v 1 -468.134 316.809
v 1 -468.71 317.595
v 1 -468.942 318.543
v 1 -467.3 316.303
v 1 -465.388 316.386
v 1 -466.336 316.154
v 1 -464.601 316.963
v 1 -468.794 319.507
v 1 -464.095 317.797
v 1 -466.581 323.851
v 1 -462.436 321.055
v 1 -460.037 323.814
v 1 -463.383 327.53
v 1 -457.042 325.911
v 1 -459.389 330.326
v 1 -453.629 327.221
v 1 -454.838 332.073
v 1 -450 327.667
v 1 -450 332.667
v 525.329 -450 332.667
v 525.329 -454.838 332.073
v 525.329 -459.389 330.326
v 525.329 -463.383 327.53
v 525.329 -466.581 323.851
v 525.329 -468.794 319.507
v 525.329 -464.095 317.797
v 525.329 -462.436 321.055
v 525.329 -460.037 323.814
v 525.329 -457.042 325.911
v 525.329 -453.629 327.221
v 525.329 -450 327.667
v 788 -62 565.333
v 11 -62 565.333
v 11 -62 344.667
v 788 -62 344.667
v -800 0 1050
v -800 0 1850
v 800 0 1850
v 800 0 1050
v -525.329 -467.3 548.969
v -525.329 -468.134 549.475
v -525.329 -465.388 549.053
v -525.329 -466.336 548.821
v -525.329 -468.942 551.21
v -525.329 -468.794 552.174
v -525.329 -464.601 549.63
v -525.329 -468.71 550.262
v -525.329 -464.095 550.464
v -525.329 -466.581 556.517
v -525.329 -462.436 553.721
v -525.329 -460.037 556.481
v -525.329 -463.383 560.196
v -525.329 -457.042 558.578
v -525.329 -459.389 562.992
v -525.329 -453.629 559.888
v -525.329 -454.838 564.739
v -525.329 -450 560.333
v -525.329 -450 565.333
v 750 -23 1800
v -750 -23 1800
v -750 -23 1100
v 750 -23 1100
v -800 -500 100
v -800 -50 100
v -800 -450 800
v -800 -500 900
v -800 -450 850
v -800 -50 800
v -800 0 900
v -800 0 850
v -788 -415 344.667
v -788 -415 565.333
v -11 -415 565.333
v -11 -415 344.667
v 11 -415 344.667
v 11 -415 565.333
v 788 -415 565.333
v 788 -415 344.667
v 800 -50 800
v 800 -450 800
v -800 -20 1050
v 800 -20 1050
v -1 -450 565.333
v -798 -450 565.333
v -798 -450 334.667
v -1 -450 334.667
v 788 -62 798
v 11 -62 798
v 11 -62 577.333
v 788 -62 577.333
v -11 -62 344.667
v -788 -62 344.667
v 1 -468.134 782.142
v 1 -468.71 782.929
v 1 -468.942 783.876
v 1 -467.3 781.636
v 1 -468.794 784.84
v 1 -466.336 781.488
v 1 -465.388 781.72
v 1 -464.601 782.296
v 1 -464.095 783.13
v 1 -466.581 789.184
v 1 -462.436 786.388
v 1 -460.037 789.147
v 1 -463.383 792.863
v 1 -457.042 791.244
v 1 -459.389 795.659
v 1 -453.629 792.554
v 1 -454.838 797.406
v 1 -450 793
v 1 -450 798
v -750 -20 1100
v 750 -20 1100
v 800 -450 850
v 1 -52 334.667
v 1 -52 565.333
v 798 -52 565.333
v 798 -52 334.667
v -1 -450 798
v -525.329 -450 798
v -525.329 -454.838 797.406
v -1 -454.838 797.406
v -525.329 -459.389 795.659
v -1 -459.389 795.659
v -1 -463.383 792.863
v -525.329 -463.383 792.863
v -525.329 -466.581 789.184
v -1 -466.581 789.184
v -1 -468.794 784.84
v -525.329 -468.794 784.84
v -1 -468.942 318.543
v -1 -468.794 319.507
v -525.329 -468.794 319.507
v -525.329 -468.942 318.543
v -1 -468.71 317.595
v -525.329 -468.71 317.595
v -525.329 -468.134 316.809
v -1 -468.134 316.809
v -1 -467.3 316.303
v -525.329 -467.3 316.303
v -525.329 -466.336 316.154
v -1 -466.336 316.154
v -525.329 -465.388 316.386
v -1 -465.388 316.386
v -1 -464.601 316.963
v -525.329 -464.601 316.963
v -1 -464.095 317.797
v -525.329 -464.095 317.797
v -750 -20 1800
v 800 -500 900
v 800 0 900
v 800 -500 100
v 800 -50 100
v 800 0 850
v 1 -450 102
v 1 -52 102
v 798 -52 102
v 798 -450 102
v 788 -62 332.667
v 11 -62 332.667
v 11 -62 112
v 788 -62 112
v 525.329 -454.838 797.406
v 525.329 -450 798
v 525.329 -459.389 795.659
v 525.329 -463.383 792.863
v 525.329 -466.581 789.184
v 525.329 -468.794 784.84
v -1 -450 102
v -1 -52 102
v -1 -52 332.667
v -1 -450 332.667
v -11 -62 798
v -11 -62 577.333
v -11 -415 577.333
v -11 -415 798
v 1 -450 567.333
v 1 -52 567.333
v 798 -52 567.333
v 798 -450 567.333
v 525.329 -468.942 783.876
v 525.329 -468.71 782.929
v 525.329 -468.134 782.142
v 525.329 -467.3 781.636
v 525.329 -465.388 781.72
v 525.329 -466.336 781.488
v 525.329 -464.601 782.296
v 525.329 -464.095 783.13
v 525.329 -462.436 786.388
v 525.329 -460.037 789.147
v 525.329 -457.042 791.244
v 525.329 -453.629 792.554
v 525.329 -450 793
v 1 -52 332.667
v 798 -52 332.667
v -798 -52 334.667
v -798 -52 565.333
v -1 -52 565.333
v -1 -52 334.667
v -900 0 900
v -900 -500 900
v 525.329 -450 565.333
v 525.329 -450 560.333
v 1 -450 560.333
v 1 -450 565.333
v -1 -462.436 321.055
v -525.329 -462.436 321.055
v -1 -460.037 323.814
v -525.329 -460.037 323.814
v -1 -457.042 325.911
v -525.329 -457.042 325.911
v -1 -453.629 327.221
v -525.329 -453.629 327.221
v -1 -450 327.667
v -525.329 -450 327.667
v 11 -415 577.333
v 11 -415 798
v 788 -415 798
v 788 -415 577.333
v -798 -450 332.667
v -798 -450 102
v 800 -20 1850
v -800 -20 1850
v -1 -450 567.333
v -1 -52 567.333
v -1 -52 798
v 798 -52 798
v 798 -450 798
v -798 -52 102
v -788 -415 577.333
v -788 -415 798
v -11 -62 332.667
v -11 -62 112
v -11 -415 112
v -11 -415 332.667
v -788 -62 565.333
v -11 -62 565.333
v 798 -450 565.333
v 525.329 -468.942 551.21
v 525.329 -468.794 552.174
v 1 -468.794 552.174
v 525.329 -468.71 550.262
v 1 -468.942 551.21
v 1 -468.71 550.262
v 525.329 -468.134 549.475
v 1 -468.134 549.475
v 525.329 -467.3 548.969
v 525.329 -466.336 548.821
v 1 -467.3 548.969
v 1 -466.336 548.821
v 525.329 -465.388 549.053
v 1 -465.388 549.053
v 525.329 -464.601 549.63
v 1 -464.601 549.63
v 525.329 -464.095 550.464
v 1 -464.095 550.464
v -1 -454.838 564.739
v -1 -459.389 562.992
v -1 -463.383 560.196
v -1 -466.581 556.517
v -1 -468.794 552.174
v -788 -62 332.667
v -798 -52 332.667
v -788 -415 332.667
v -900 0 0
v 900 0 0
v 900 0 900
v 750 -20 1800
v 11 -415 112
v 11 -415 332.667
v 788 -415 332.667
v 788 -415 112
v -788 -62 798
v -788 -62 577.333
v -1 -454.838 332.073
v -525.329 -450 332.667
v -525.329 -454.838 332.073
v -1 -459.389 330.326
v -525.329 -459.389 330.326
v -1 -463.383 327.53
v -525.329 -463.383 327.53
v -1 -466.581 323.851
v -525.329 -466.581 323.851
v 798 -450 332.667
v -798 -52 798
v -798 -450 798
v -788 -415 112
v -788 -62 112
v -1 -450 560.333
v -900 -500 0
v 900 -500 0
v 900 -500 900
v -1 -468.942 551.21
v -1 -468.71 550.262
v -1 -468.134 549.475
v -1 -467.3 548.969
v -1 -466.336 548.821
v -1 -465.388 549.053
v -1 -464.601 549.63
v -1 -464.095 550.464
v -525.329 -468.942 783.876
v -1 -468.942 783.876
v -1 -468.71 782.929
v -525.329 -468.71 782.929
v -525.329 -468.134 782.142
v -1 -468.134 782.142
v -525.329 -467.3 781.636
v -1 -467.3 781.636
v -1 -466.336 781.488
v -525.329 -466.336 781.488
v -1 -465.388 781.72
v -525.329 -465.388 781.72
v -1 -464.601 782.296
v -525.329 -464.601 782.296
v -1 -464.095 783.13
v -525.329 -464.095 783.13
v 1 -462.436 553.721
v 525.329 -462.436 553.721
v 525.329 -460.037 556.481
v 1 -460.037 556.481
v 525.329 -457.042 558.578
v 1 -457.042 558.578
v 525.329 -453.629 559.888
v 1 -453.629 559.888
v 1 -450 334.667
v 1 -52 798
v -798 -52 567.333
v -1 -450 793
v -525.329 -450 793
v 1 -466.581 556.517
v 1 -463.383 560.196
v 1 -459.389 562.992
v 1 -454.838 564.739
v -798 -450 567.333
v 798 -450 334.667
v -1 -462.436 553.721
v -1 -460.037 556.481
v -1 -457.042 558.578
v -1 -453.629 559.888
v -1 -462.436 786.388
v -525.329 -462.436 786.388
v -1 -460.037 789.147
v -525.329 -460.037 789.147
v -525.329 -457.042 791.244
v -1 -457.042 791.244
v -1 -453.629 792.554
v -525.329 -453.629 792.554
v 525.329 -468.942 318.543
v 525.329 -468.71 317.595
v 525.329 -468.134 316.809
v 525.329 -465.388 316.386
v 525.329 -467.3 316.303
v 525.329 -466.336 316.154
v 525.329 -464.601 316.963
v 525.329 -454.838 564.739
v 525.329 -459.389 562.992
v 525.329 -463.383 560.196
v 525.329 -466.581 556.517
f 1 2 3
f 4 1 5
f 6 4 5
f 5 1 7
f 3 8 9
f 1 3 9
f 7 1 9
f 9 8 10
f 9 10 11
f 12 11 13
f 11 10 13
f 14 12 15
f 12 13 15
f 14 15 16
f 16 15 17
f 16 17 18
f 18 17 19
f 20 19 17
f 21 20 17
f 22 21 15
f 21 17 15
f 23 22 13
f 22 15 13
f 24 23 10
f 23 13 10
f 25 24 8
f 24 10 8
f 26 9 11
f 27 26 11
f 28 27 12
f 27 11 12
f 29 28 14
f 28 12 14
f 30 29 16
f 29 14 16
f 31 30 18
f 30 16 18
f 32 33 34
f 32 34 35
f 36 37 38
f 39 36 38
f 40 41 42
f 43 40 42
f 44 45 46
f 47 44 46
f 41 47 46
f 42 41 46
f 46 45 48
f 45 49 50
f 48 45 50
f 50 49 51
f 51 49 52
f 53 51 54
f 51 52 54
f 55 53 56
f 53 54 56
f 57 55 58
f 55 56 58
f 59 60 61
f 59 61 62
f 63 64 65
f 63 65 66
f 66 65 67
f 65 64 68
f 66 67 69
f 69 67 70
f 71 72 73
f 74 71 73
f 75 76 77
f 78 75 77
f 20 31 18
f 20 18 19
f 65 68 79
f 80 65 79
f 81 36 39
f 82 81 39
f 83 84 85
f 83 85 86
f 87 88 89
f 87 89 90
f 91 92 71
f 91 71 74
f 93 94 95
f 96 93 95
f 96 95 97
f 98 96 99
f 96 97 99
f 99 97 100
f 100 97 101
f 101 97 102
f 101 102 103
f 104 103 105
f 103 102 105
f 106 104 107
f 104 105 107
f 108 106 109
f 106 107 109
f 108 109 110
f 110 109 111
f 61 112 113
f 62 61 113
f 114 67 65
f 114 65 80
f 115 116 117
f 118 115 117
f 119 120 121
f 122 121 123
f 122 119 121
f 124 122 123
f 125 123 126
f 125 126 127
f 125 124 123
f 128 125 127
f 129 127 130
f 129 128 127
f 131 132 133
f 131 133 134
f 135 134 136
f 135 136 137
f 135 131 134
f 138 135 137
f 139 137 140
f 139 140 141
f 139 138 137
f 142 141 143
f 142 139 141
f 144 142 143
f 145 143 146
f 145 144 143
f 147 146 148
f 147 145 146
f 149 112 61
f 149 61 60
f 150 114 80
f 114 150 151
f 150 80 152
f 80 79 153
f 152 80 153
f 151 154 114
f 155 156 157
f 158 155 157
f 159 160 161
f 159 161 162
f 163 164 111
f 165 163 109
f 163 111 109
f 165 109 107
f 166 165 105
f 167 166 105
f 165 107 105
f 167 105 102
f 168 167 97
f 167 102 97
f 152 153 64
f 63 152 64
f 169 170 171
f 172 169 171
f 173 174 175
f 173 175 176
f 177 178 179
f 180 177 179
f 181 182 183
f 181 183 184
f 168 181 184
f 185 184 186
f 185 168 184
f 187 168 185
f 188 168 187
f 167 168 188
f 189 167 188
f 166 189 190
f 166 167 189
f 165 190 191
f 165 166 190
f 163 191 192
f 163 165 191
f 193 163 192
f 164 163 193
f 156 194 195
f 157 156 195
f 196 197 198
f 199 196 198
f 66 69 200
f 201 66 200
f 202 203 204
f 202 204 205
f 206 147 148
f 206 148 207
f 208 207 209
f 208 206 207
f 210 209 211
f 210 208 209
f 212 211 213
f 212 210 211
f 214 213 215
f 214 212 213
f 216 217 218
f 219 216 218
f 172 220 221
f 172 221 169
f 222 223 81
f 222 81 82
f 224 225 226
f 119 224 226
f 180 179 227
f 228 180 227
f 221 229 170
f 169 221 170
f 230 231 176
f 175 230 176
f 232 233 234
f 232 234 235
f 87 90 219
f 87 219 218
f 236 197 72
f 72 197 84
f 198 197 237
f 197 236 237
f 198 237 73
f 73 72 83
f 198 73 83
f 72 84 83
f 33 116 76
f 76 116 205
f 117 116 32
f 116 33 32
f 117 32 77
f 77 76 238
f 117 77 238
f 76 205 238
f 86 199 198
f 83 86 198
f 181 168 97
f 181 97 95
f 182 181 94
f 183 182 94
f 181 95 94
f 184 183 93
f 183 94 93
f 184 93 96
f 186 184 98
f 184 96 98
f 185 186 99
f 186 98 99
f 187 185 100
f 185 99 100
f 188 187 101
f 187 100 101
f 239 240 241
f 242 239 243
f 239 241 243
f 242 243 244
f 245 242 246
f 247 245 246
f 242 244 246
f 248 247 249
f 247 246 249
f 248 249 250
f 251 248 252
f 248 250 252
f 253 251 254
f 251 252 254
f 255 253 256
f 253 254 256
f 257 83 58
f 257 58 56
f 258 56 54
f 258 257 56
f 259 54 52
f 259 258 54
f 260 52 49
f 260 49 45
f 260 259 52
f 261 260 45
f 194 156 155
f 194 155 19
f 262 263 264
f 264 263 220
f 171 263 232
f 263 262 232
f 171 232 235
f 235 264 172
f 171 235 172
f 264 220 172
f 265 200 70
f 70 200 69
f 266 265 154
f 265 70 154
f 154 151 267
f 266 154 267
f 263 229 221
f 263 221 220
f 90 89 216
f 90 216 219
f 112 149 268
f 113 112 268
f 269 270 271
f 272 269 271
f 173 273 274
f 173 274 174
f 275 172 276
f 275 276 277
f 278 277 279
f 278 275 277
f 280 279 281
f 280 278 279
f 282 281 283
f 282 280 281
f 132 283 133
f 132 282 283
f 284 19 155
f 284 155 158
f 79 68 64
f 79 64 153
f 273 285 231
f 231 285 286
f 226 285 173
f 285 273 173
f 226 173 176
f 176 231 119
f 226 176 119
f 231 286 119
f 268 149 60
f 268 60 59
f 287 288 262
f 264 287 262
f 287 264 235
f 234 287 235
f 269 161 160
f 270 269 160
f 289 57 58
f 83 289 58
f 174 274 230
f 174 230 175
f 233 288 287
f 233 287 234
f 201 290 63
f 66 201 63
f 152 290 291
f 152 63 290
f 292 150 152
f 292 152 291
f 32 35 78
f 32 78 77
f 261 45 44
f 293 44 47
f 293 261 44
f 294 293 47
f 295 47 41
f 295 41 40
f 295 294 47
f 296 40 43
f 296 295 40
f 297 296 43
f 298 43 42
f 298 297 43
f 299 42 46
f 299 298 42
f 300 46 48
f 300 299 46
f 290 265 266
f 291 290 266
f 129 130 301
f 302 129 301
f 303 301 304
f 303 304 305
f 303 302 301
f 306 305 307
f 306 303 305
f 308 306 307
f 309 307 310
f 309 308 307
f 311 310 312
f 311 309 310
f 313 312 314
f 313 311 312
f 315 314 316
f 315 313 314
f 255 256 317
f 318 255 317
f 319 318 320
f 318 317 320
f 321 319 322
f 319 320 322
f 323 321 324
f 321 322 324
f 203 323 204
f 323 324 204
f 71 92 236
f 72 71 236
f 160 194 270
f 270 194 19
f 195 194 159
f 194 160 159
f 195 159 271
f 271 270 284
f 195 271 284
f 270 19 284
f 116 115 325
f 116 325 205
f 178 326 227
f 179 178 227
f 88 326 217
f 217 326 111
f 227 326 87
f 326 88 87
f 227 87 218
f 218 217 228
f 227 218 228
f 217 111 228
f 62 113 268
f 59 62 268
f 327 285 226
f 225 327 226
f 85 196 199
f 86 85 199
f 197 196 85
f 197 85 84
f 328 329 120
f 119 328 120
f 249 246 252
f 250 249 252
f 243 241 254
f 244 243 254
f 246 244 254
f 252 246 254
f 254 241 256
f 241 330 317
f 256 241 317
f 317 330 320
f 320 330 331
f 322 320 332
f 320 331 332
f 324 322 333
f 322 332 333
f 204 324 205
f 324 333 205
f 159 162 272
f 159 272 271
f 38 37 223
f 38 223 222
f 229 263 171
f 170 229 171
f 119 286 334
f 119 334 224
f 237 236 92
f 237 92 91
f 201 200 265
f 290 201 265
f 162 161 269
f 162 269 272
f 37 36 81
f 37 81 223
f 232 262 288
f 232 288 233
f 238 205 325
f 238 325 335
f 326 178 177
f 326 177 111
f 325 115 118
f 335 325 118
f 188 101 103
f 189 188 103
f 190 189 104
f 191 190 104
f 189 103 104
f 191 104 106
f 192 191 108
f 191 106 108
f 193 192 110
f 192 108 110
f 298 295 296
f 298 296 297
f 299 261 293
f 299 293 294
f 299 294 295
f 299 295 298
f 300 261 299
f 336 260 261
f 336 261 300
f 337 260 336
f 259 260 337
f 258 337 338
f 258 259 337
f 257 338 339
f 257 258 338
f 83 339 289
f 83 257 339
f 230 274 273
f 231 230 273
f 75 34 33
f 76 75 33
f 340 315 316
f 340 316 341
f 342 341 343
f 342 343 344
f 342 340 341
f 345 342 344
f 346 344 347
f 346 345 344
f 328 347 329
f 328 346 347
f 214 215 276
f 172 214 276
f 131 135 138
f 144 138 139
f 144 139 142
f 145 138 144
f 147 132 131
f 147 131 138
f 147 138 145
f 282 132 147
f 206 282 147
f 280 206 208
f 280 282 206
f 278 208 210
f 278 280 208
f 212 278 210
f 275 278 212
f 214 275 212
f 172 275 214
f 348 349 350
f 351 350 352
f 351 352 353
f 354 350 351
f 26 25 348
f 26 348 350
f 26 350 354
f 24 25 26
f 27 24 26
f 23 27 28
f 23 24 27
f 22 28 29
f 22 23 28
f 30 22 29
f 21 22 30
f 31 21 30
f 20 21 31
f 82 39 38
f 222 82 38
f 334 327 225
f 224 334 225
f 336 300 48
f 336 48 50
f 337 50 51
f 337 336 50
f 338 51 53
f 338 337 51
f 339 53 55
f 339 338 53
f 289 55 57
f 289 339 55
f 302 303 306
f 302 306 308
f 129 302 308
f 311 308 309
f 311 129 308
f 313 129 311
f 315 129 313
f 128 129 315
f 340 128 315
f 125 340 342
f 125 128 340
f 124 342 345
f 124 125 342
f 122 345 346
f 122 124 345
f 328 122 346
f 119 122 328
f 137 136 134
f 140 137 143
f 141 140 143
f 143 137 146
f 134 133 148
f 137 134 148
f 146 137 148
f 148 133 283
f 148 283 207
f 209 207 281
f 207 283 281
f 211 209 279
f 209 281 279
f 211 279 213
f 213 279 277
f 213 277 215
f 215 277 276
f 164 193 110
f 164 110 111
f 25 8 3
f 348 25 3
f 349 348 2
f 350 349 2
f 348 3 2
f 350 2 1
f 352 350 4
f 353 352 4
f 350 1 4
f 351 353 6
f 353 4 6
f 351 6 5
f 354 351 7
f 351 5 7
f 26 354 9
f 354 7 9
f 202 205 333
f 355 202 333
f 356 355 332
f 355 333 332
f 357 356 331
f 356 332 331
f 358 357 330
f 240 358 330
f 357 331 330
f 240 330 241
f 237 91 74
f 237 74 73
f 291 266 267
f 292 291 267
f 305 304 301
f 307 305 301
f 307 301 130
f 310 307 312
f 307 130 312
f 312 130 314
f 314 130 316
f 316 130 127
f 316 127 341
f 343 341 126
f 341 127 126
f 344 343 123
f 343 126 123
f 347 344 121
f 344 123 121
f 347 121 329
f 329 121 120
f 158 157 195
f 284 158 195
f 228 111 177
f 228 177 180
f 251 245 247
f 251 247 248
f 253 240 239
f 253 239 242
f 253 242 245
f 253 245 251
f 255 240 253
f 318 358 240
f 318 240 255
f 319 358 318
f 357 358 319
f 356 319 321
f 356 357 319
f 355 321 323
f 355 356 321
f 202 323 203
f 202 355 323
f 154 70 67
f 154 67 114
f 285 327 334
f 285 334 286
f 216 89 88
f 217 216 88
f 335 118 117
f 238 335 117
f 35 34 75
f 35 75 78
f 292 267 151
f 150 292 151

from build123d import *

# Parameters (mm, degrees)
F9_DEPTH  = 500
F8_W      = 1600
F8_H      = 50
F10_DEPTH = 450
F8_H_2    = 700
F8_W_2    = 797
F8_H_3    = 230.6666666667
F11_DEPTH = 50
F12_START = 52
F12_DEPTH = 398
F13_T     = -10
F13_2_T   = -10
F13_3_T   = -10
F13_4_T   = -10
F13_5_T   = -10
F13_6_T   = -10
F14_DEPTH = 25
F16_START = 1
F16_DEPTH = 524.3288918326
F8_H_4    = 800
F8_W_3    = 1500
F18_DEPTH = 20
F19_START = 20
F19_DEPTH = 3


with BuildPart() as f9:
    # F8 (on Front) → F9 (new body)
    with BuildSketch(Plane.XZ):
        Polygon((-900, 900), (-900, 0), (900, 0), (900, 900), (800, 900), (800, 850), (800, 800), (800, 100), (-800, 100), (-800, 800), (-800, 850), (-800, 900), align=None)
    extrude(amount=F9_DEPTH)

    # F8 (on Front) → F10 (join)
    with BuildSketch(Plane.XZ):
        with Locations((0, 825)):
            Rectangle(F8_W, F8_H)
    extrude(amount=F10_DEPTH)

    # F8 (on Front) → F11 (join)
    with BuildSketch(Plane.XZ):
        with Locations((0, 450)):
            Rectangle(F8_W, F8_H_2)
        with Locations((-399.5, 217.3333333333)):
            Rectangle(F8_W_2, F8_H_3, mode=Mode.SUBTRACT)
        with Locations((-399.5, 450)):
            Rectangle(F8_W_2, F8_H_3, mode=Mode.SUBTRACT)
        with Locations((-399.5, 682.6666666667)):
            Rectangle(F8_W_2, F8_H_3, mode=Mode.SUBTRACT)
        with Locations((399.5, 217.3333333333)):
            Rectangle(F8_W_2, F8_H_3, mode=Mode.SUBTRACT)
        with Locations((399.5, 450)):
            Rectangle(F8_W_2, F8_H_3, mode=Mode.SUBTRACT)
        with Locations((399.5, 682.6666666667)):
            Rectangle(F8_W_2, F8_H_3, mode=Mode.SUBTRACT)
        with Locations((-399.5, 682.6666666667)):
            Rectangle(F8_W_2, F8_H_3)
        with Locations((-399.5, 450)):
            Rectangle(F8_W_2, F8_H_3)
        with Locations((-399.5, 217.3333333333)):
            Rectangle(F8_W_2, F8_H_3)
        with Locations((399.5, 682.6666666667)):
            Rectangle(F8_W_2, F8_H_3)
        with Locations((399.5, 450)):
            Rectangle(F8_W_2, F8_H_3)
        with Locations((399.5, 217.3333333333)):
            Rectangle(F8_W_2, F8_H_3)
    extrude(amount=F11_DEPTH)


with BuildPart() as f12:
    # F8 (on Front) → F12 (new body)
    with BuildSketch(Plane.XZ.offset(F12_START)):
        with Locations((-399.5, 682.6666666667)):
            Rectangle(F8_W_2, F8_H_3)
    extrude(amount=F12_DEPTH)

    # F13#2
    f13_2_openings = [f12.faces().sort_by_distance(p)[0] for p in [
        (-399.5, -251, 798),
    ]]
    offset(amount=F13_2_T, openings=f13_2_openings)

    # F14 (add): a face of the model
    f14_faces = [f12.faces().sort_by_distance(p)[0] for p in [
        (-399.5, -440, 687.6666666667),
    ]]
    extrude(f14_faces, amount=F14_DEPTH)


with BuildPart() as f12b:
    # F8 (on Front) → F12, piece 2 (new body)
    with BuildSketch(Plane.XZ.offset(F12_START)):
        with Locations((399.5, 682.6666666667)):
            Rectangle(F8_W_2, F8_H_3)
    extrude(amount=F12_DEPTH)

    # F13
    f13_openings = [f12b.faces().sort_by_distance(p)[0] for p in [
        (399.5, -251, 798),
    ]]
    offset(amount=F13_T, openings=f13_openings)

    # F14#2 (add): a face of the model
    f14_2_faces = [f12b.faces().sort_by_distance(p)[0] for p in [
        (399.5, -440, 687.6666666667),
    ]]
    extrude(f14_2_faces, amount=F14_DEPTH)


with BuildPart() as f12c:
    # F8 (on Front) → F12, piece 3 (new body)
    with BuildSketch(Plane.XZ.offset(F12_START)):
        with Locations((-399.5, 450)):
            Rectangle(F8_W_2, F8_H_3)
    extrude(amount=F12_DEPTH)

    # F13#4
    f13_4_openings = [f12c.faces().sort_by_distance(p)[0] for p in [
        (-399.5, -251, 565.333333),
    ]]
    offset(amount=F13_4_T, openings=f13_4_openings)

    # F14#3 (add): a face of the model
    f14_3_faces = [f12c.faces().sort_by_distance(p)[0] for p in [
        (-399.5, -440, 455),
    ]]
    extrude(f14_3_faces, amount=F14_DEPTH)


with BuildPart() as f12d:
    # F8 (on Front) → F12, piece 4 (new body)
    with BuildSketch(Plane.XZ.offset(F12_START)):
        with Locations((399.5, 450)):
            Rectangle(F8_W_2, F8_H_3)
    extrude(amount=F12_DEPTH)

    # F13#3
    f13_3_openings = [f12d.faces().sort_by_distance(p)[0] for p in [
        (399.5, -251, 565.333333),
    ]]
    offset(amount=F13_3_T, openings=f13_3_openings)

    # F14#4 (add): a face of the model
    f14_4_faces = [f12d.faces().sort_by_distance(p)[0] for p in [
        (399.5, -440, 455),
    ]]
    extrude(f14_4_faces, amount=F14_DEPTH)


with BuildPart() as f12e:
    # F8 (on Front) → F12, piece 5 (new body)
    with BuildSketch(Plane.XZ.offset(F12_START)):
        with Locations((-399.5, 217.3333333333)):
            Rectangle(F8_W_2, F8_H_3)
    extrude(amount=F12_DEPTH)

    # F13#6
    f13_6_openings = [f12e.faces().sort_by_distance(p)[0] for p in [
        (-399.5, -251, 332.666667),
    ]]
    offset(amount=F13_6_T, openings=f13_6_openings)

    # F14#5 (add): a face of the model
    f14_5_faces = [f12e.faces().sort_by_distance(p)[0] for p in [
        (-399.5, -440, 222.3333333333),
    ]]
    extrude(f14_5_faces, amount=F14_DEPTH)


with BuildPart() as f12f:
    # F8 (on Front) → F12, piece 6 (new body)
    with BuildSketch(Plane.XZ.offset(F12_START)):
        with Locations((399.5, 217.3333333333)):
            Rectangle(F8_W_2, F8_H_3)
    extrude(amount=F12_DEPTH)

    # F13#5
    f13_5_openings = [f12f.faces().sort_by_distance(p)[0] for p in [
        (399.5, -251, 332.666667),
    ]]
    offset(amount=F13_5_T, openings=f13_5_openings)

    # F14#6 (add): a face of the model
    f14_6_faces = [f12f.faces().sort_by_distance(p)[0] for p in [
        (399.5, -440, 222.3333333333),
    ]]
    extrude(f14_6_faces, amount=F14_DEPTH)


with BuildPart() as f16:
    # F15 (on Right) → F16 (new body)
    with BuildSketch(Plane.YZ.offset(F16_START)):
        with BuildLine():
            Line((-450, 793), (-450, 798))
            ThreePointArc((-450, 798), (-461.471528727, 794.3830408858), (-468.7938524157, 784.8404028665))
            ThreePointArc((-468.7938524157, 784.8404028665), (-467.2996712221, 781.6361209562), (-464.0953893118, 783.1303021499))
            ThreePointArc((-464.0953893118, 783.1303021499), (-458.6036465453, 790.2872806643), (-450, 793))
        make_face()
    extrude(amount=F16_DEPTH)


with BuildPart() as f16b:
    # F15 (on Right) → F16, piece 2 (new body)
    with BuildSketch(Plane.YZ.offset(F16_START)):
        with BuildLine():
            Line((-450, 560.3333333333), (-450, 565.3333333333))
            ThreePointArc((-450, 565.3333333333), (-461.471528727, 561.7163742191), (-468.7938524157, 552.1737361998))
            ThreePointArc((-468.7938524157, 552.1737361998), (-467.2996712221, 548.9694542896), (-464.0953893118, 550.4636354832))
            ThreePointArc((-464.0953893118, 550.4636354832), (-458.6036465453, 557.6206139977), (-450, 560.3333333333))
        make_face()
    extrude(amount=F16_DEPTH)


with BuildPart() as f16c:
    # F15 (on Right) → F16, piece 3 (new body)
    with BuildSketch(Plane.YZ.offset(F16_START)):
        with BuildLine():
            Line((-450, 327.6666666667), (-450, 332.6666666667))
            ThreePointArc((-450, 332.6666666667), (-461.471528727, 329.0497075524), (-468.7938524157, 319.5070695332))
            ThreePointArc((-468.7938524157, 319.5070695332), (-467.2996712221, 316.3027876229), (-464.0953893118, 317.7969688166))
            ThreePointArc((-464.0953893118, 317.7969688166), (-458.6036465453, 324.953947331), (-450, 327.6666666667))
        make_face()
    extrude(amount=F16_DEPTH)


with BuildPart() as f17_1:
    # F17: instance of F16
    add(f16.part.mirror(Plane.YZ))


with BuildPart() as f17_2:
    # F17: instance of F16b
    add(f16b.part.mirror(Plane.YZ))


with BuildPart() as f17_3:
    # F17: instance of F16c
    add(f16c.part.mirror(Plane.YZ))


with BuildPart() as f18:
    # F8 (on Front) → F18 (new body)
    with BuildSketch(Plane.XZ):
        with Locations((0, 1450)):
            Rectangle(F8_W, F8_H_4)
        with Locations((0, 1450)):
            Rectangle(F8_W_3, F8_H_2, mode=Mode.SUBTRACT)
        with Locations((0, 1450)):
            Rectangle(F8_W_3, F8_H_2)
    extrude(amount=F18_DEPTH)


with BuildPart() as f19:
    # F8 (on Front) → F19 (new body)
    with BuildSketch(Plane.XZ.offset(F19_START)):
        with Locations((0, 1450)):
            Rectangle(F8_W_3, F8_H_2)
    extrude(amount=F19_DEPTH)


solid = Compound([f9.part, f12.part, f12b.part, f12c.part, f12d.part, f12e.part, f12f.part, f16.part, f16b.part, f16c.part, f17_1.part, f17_2.part, f17_3.part, f18.part, f19.part])
